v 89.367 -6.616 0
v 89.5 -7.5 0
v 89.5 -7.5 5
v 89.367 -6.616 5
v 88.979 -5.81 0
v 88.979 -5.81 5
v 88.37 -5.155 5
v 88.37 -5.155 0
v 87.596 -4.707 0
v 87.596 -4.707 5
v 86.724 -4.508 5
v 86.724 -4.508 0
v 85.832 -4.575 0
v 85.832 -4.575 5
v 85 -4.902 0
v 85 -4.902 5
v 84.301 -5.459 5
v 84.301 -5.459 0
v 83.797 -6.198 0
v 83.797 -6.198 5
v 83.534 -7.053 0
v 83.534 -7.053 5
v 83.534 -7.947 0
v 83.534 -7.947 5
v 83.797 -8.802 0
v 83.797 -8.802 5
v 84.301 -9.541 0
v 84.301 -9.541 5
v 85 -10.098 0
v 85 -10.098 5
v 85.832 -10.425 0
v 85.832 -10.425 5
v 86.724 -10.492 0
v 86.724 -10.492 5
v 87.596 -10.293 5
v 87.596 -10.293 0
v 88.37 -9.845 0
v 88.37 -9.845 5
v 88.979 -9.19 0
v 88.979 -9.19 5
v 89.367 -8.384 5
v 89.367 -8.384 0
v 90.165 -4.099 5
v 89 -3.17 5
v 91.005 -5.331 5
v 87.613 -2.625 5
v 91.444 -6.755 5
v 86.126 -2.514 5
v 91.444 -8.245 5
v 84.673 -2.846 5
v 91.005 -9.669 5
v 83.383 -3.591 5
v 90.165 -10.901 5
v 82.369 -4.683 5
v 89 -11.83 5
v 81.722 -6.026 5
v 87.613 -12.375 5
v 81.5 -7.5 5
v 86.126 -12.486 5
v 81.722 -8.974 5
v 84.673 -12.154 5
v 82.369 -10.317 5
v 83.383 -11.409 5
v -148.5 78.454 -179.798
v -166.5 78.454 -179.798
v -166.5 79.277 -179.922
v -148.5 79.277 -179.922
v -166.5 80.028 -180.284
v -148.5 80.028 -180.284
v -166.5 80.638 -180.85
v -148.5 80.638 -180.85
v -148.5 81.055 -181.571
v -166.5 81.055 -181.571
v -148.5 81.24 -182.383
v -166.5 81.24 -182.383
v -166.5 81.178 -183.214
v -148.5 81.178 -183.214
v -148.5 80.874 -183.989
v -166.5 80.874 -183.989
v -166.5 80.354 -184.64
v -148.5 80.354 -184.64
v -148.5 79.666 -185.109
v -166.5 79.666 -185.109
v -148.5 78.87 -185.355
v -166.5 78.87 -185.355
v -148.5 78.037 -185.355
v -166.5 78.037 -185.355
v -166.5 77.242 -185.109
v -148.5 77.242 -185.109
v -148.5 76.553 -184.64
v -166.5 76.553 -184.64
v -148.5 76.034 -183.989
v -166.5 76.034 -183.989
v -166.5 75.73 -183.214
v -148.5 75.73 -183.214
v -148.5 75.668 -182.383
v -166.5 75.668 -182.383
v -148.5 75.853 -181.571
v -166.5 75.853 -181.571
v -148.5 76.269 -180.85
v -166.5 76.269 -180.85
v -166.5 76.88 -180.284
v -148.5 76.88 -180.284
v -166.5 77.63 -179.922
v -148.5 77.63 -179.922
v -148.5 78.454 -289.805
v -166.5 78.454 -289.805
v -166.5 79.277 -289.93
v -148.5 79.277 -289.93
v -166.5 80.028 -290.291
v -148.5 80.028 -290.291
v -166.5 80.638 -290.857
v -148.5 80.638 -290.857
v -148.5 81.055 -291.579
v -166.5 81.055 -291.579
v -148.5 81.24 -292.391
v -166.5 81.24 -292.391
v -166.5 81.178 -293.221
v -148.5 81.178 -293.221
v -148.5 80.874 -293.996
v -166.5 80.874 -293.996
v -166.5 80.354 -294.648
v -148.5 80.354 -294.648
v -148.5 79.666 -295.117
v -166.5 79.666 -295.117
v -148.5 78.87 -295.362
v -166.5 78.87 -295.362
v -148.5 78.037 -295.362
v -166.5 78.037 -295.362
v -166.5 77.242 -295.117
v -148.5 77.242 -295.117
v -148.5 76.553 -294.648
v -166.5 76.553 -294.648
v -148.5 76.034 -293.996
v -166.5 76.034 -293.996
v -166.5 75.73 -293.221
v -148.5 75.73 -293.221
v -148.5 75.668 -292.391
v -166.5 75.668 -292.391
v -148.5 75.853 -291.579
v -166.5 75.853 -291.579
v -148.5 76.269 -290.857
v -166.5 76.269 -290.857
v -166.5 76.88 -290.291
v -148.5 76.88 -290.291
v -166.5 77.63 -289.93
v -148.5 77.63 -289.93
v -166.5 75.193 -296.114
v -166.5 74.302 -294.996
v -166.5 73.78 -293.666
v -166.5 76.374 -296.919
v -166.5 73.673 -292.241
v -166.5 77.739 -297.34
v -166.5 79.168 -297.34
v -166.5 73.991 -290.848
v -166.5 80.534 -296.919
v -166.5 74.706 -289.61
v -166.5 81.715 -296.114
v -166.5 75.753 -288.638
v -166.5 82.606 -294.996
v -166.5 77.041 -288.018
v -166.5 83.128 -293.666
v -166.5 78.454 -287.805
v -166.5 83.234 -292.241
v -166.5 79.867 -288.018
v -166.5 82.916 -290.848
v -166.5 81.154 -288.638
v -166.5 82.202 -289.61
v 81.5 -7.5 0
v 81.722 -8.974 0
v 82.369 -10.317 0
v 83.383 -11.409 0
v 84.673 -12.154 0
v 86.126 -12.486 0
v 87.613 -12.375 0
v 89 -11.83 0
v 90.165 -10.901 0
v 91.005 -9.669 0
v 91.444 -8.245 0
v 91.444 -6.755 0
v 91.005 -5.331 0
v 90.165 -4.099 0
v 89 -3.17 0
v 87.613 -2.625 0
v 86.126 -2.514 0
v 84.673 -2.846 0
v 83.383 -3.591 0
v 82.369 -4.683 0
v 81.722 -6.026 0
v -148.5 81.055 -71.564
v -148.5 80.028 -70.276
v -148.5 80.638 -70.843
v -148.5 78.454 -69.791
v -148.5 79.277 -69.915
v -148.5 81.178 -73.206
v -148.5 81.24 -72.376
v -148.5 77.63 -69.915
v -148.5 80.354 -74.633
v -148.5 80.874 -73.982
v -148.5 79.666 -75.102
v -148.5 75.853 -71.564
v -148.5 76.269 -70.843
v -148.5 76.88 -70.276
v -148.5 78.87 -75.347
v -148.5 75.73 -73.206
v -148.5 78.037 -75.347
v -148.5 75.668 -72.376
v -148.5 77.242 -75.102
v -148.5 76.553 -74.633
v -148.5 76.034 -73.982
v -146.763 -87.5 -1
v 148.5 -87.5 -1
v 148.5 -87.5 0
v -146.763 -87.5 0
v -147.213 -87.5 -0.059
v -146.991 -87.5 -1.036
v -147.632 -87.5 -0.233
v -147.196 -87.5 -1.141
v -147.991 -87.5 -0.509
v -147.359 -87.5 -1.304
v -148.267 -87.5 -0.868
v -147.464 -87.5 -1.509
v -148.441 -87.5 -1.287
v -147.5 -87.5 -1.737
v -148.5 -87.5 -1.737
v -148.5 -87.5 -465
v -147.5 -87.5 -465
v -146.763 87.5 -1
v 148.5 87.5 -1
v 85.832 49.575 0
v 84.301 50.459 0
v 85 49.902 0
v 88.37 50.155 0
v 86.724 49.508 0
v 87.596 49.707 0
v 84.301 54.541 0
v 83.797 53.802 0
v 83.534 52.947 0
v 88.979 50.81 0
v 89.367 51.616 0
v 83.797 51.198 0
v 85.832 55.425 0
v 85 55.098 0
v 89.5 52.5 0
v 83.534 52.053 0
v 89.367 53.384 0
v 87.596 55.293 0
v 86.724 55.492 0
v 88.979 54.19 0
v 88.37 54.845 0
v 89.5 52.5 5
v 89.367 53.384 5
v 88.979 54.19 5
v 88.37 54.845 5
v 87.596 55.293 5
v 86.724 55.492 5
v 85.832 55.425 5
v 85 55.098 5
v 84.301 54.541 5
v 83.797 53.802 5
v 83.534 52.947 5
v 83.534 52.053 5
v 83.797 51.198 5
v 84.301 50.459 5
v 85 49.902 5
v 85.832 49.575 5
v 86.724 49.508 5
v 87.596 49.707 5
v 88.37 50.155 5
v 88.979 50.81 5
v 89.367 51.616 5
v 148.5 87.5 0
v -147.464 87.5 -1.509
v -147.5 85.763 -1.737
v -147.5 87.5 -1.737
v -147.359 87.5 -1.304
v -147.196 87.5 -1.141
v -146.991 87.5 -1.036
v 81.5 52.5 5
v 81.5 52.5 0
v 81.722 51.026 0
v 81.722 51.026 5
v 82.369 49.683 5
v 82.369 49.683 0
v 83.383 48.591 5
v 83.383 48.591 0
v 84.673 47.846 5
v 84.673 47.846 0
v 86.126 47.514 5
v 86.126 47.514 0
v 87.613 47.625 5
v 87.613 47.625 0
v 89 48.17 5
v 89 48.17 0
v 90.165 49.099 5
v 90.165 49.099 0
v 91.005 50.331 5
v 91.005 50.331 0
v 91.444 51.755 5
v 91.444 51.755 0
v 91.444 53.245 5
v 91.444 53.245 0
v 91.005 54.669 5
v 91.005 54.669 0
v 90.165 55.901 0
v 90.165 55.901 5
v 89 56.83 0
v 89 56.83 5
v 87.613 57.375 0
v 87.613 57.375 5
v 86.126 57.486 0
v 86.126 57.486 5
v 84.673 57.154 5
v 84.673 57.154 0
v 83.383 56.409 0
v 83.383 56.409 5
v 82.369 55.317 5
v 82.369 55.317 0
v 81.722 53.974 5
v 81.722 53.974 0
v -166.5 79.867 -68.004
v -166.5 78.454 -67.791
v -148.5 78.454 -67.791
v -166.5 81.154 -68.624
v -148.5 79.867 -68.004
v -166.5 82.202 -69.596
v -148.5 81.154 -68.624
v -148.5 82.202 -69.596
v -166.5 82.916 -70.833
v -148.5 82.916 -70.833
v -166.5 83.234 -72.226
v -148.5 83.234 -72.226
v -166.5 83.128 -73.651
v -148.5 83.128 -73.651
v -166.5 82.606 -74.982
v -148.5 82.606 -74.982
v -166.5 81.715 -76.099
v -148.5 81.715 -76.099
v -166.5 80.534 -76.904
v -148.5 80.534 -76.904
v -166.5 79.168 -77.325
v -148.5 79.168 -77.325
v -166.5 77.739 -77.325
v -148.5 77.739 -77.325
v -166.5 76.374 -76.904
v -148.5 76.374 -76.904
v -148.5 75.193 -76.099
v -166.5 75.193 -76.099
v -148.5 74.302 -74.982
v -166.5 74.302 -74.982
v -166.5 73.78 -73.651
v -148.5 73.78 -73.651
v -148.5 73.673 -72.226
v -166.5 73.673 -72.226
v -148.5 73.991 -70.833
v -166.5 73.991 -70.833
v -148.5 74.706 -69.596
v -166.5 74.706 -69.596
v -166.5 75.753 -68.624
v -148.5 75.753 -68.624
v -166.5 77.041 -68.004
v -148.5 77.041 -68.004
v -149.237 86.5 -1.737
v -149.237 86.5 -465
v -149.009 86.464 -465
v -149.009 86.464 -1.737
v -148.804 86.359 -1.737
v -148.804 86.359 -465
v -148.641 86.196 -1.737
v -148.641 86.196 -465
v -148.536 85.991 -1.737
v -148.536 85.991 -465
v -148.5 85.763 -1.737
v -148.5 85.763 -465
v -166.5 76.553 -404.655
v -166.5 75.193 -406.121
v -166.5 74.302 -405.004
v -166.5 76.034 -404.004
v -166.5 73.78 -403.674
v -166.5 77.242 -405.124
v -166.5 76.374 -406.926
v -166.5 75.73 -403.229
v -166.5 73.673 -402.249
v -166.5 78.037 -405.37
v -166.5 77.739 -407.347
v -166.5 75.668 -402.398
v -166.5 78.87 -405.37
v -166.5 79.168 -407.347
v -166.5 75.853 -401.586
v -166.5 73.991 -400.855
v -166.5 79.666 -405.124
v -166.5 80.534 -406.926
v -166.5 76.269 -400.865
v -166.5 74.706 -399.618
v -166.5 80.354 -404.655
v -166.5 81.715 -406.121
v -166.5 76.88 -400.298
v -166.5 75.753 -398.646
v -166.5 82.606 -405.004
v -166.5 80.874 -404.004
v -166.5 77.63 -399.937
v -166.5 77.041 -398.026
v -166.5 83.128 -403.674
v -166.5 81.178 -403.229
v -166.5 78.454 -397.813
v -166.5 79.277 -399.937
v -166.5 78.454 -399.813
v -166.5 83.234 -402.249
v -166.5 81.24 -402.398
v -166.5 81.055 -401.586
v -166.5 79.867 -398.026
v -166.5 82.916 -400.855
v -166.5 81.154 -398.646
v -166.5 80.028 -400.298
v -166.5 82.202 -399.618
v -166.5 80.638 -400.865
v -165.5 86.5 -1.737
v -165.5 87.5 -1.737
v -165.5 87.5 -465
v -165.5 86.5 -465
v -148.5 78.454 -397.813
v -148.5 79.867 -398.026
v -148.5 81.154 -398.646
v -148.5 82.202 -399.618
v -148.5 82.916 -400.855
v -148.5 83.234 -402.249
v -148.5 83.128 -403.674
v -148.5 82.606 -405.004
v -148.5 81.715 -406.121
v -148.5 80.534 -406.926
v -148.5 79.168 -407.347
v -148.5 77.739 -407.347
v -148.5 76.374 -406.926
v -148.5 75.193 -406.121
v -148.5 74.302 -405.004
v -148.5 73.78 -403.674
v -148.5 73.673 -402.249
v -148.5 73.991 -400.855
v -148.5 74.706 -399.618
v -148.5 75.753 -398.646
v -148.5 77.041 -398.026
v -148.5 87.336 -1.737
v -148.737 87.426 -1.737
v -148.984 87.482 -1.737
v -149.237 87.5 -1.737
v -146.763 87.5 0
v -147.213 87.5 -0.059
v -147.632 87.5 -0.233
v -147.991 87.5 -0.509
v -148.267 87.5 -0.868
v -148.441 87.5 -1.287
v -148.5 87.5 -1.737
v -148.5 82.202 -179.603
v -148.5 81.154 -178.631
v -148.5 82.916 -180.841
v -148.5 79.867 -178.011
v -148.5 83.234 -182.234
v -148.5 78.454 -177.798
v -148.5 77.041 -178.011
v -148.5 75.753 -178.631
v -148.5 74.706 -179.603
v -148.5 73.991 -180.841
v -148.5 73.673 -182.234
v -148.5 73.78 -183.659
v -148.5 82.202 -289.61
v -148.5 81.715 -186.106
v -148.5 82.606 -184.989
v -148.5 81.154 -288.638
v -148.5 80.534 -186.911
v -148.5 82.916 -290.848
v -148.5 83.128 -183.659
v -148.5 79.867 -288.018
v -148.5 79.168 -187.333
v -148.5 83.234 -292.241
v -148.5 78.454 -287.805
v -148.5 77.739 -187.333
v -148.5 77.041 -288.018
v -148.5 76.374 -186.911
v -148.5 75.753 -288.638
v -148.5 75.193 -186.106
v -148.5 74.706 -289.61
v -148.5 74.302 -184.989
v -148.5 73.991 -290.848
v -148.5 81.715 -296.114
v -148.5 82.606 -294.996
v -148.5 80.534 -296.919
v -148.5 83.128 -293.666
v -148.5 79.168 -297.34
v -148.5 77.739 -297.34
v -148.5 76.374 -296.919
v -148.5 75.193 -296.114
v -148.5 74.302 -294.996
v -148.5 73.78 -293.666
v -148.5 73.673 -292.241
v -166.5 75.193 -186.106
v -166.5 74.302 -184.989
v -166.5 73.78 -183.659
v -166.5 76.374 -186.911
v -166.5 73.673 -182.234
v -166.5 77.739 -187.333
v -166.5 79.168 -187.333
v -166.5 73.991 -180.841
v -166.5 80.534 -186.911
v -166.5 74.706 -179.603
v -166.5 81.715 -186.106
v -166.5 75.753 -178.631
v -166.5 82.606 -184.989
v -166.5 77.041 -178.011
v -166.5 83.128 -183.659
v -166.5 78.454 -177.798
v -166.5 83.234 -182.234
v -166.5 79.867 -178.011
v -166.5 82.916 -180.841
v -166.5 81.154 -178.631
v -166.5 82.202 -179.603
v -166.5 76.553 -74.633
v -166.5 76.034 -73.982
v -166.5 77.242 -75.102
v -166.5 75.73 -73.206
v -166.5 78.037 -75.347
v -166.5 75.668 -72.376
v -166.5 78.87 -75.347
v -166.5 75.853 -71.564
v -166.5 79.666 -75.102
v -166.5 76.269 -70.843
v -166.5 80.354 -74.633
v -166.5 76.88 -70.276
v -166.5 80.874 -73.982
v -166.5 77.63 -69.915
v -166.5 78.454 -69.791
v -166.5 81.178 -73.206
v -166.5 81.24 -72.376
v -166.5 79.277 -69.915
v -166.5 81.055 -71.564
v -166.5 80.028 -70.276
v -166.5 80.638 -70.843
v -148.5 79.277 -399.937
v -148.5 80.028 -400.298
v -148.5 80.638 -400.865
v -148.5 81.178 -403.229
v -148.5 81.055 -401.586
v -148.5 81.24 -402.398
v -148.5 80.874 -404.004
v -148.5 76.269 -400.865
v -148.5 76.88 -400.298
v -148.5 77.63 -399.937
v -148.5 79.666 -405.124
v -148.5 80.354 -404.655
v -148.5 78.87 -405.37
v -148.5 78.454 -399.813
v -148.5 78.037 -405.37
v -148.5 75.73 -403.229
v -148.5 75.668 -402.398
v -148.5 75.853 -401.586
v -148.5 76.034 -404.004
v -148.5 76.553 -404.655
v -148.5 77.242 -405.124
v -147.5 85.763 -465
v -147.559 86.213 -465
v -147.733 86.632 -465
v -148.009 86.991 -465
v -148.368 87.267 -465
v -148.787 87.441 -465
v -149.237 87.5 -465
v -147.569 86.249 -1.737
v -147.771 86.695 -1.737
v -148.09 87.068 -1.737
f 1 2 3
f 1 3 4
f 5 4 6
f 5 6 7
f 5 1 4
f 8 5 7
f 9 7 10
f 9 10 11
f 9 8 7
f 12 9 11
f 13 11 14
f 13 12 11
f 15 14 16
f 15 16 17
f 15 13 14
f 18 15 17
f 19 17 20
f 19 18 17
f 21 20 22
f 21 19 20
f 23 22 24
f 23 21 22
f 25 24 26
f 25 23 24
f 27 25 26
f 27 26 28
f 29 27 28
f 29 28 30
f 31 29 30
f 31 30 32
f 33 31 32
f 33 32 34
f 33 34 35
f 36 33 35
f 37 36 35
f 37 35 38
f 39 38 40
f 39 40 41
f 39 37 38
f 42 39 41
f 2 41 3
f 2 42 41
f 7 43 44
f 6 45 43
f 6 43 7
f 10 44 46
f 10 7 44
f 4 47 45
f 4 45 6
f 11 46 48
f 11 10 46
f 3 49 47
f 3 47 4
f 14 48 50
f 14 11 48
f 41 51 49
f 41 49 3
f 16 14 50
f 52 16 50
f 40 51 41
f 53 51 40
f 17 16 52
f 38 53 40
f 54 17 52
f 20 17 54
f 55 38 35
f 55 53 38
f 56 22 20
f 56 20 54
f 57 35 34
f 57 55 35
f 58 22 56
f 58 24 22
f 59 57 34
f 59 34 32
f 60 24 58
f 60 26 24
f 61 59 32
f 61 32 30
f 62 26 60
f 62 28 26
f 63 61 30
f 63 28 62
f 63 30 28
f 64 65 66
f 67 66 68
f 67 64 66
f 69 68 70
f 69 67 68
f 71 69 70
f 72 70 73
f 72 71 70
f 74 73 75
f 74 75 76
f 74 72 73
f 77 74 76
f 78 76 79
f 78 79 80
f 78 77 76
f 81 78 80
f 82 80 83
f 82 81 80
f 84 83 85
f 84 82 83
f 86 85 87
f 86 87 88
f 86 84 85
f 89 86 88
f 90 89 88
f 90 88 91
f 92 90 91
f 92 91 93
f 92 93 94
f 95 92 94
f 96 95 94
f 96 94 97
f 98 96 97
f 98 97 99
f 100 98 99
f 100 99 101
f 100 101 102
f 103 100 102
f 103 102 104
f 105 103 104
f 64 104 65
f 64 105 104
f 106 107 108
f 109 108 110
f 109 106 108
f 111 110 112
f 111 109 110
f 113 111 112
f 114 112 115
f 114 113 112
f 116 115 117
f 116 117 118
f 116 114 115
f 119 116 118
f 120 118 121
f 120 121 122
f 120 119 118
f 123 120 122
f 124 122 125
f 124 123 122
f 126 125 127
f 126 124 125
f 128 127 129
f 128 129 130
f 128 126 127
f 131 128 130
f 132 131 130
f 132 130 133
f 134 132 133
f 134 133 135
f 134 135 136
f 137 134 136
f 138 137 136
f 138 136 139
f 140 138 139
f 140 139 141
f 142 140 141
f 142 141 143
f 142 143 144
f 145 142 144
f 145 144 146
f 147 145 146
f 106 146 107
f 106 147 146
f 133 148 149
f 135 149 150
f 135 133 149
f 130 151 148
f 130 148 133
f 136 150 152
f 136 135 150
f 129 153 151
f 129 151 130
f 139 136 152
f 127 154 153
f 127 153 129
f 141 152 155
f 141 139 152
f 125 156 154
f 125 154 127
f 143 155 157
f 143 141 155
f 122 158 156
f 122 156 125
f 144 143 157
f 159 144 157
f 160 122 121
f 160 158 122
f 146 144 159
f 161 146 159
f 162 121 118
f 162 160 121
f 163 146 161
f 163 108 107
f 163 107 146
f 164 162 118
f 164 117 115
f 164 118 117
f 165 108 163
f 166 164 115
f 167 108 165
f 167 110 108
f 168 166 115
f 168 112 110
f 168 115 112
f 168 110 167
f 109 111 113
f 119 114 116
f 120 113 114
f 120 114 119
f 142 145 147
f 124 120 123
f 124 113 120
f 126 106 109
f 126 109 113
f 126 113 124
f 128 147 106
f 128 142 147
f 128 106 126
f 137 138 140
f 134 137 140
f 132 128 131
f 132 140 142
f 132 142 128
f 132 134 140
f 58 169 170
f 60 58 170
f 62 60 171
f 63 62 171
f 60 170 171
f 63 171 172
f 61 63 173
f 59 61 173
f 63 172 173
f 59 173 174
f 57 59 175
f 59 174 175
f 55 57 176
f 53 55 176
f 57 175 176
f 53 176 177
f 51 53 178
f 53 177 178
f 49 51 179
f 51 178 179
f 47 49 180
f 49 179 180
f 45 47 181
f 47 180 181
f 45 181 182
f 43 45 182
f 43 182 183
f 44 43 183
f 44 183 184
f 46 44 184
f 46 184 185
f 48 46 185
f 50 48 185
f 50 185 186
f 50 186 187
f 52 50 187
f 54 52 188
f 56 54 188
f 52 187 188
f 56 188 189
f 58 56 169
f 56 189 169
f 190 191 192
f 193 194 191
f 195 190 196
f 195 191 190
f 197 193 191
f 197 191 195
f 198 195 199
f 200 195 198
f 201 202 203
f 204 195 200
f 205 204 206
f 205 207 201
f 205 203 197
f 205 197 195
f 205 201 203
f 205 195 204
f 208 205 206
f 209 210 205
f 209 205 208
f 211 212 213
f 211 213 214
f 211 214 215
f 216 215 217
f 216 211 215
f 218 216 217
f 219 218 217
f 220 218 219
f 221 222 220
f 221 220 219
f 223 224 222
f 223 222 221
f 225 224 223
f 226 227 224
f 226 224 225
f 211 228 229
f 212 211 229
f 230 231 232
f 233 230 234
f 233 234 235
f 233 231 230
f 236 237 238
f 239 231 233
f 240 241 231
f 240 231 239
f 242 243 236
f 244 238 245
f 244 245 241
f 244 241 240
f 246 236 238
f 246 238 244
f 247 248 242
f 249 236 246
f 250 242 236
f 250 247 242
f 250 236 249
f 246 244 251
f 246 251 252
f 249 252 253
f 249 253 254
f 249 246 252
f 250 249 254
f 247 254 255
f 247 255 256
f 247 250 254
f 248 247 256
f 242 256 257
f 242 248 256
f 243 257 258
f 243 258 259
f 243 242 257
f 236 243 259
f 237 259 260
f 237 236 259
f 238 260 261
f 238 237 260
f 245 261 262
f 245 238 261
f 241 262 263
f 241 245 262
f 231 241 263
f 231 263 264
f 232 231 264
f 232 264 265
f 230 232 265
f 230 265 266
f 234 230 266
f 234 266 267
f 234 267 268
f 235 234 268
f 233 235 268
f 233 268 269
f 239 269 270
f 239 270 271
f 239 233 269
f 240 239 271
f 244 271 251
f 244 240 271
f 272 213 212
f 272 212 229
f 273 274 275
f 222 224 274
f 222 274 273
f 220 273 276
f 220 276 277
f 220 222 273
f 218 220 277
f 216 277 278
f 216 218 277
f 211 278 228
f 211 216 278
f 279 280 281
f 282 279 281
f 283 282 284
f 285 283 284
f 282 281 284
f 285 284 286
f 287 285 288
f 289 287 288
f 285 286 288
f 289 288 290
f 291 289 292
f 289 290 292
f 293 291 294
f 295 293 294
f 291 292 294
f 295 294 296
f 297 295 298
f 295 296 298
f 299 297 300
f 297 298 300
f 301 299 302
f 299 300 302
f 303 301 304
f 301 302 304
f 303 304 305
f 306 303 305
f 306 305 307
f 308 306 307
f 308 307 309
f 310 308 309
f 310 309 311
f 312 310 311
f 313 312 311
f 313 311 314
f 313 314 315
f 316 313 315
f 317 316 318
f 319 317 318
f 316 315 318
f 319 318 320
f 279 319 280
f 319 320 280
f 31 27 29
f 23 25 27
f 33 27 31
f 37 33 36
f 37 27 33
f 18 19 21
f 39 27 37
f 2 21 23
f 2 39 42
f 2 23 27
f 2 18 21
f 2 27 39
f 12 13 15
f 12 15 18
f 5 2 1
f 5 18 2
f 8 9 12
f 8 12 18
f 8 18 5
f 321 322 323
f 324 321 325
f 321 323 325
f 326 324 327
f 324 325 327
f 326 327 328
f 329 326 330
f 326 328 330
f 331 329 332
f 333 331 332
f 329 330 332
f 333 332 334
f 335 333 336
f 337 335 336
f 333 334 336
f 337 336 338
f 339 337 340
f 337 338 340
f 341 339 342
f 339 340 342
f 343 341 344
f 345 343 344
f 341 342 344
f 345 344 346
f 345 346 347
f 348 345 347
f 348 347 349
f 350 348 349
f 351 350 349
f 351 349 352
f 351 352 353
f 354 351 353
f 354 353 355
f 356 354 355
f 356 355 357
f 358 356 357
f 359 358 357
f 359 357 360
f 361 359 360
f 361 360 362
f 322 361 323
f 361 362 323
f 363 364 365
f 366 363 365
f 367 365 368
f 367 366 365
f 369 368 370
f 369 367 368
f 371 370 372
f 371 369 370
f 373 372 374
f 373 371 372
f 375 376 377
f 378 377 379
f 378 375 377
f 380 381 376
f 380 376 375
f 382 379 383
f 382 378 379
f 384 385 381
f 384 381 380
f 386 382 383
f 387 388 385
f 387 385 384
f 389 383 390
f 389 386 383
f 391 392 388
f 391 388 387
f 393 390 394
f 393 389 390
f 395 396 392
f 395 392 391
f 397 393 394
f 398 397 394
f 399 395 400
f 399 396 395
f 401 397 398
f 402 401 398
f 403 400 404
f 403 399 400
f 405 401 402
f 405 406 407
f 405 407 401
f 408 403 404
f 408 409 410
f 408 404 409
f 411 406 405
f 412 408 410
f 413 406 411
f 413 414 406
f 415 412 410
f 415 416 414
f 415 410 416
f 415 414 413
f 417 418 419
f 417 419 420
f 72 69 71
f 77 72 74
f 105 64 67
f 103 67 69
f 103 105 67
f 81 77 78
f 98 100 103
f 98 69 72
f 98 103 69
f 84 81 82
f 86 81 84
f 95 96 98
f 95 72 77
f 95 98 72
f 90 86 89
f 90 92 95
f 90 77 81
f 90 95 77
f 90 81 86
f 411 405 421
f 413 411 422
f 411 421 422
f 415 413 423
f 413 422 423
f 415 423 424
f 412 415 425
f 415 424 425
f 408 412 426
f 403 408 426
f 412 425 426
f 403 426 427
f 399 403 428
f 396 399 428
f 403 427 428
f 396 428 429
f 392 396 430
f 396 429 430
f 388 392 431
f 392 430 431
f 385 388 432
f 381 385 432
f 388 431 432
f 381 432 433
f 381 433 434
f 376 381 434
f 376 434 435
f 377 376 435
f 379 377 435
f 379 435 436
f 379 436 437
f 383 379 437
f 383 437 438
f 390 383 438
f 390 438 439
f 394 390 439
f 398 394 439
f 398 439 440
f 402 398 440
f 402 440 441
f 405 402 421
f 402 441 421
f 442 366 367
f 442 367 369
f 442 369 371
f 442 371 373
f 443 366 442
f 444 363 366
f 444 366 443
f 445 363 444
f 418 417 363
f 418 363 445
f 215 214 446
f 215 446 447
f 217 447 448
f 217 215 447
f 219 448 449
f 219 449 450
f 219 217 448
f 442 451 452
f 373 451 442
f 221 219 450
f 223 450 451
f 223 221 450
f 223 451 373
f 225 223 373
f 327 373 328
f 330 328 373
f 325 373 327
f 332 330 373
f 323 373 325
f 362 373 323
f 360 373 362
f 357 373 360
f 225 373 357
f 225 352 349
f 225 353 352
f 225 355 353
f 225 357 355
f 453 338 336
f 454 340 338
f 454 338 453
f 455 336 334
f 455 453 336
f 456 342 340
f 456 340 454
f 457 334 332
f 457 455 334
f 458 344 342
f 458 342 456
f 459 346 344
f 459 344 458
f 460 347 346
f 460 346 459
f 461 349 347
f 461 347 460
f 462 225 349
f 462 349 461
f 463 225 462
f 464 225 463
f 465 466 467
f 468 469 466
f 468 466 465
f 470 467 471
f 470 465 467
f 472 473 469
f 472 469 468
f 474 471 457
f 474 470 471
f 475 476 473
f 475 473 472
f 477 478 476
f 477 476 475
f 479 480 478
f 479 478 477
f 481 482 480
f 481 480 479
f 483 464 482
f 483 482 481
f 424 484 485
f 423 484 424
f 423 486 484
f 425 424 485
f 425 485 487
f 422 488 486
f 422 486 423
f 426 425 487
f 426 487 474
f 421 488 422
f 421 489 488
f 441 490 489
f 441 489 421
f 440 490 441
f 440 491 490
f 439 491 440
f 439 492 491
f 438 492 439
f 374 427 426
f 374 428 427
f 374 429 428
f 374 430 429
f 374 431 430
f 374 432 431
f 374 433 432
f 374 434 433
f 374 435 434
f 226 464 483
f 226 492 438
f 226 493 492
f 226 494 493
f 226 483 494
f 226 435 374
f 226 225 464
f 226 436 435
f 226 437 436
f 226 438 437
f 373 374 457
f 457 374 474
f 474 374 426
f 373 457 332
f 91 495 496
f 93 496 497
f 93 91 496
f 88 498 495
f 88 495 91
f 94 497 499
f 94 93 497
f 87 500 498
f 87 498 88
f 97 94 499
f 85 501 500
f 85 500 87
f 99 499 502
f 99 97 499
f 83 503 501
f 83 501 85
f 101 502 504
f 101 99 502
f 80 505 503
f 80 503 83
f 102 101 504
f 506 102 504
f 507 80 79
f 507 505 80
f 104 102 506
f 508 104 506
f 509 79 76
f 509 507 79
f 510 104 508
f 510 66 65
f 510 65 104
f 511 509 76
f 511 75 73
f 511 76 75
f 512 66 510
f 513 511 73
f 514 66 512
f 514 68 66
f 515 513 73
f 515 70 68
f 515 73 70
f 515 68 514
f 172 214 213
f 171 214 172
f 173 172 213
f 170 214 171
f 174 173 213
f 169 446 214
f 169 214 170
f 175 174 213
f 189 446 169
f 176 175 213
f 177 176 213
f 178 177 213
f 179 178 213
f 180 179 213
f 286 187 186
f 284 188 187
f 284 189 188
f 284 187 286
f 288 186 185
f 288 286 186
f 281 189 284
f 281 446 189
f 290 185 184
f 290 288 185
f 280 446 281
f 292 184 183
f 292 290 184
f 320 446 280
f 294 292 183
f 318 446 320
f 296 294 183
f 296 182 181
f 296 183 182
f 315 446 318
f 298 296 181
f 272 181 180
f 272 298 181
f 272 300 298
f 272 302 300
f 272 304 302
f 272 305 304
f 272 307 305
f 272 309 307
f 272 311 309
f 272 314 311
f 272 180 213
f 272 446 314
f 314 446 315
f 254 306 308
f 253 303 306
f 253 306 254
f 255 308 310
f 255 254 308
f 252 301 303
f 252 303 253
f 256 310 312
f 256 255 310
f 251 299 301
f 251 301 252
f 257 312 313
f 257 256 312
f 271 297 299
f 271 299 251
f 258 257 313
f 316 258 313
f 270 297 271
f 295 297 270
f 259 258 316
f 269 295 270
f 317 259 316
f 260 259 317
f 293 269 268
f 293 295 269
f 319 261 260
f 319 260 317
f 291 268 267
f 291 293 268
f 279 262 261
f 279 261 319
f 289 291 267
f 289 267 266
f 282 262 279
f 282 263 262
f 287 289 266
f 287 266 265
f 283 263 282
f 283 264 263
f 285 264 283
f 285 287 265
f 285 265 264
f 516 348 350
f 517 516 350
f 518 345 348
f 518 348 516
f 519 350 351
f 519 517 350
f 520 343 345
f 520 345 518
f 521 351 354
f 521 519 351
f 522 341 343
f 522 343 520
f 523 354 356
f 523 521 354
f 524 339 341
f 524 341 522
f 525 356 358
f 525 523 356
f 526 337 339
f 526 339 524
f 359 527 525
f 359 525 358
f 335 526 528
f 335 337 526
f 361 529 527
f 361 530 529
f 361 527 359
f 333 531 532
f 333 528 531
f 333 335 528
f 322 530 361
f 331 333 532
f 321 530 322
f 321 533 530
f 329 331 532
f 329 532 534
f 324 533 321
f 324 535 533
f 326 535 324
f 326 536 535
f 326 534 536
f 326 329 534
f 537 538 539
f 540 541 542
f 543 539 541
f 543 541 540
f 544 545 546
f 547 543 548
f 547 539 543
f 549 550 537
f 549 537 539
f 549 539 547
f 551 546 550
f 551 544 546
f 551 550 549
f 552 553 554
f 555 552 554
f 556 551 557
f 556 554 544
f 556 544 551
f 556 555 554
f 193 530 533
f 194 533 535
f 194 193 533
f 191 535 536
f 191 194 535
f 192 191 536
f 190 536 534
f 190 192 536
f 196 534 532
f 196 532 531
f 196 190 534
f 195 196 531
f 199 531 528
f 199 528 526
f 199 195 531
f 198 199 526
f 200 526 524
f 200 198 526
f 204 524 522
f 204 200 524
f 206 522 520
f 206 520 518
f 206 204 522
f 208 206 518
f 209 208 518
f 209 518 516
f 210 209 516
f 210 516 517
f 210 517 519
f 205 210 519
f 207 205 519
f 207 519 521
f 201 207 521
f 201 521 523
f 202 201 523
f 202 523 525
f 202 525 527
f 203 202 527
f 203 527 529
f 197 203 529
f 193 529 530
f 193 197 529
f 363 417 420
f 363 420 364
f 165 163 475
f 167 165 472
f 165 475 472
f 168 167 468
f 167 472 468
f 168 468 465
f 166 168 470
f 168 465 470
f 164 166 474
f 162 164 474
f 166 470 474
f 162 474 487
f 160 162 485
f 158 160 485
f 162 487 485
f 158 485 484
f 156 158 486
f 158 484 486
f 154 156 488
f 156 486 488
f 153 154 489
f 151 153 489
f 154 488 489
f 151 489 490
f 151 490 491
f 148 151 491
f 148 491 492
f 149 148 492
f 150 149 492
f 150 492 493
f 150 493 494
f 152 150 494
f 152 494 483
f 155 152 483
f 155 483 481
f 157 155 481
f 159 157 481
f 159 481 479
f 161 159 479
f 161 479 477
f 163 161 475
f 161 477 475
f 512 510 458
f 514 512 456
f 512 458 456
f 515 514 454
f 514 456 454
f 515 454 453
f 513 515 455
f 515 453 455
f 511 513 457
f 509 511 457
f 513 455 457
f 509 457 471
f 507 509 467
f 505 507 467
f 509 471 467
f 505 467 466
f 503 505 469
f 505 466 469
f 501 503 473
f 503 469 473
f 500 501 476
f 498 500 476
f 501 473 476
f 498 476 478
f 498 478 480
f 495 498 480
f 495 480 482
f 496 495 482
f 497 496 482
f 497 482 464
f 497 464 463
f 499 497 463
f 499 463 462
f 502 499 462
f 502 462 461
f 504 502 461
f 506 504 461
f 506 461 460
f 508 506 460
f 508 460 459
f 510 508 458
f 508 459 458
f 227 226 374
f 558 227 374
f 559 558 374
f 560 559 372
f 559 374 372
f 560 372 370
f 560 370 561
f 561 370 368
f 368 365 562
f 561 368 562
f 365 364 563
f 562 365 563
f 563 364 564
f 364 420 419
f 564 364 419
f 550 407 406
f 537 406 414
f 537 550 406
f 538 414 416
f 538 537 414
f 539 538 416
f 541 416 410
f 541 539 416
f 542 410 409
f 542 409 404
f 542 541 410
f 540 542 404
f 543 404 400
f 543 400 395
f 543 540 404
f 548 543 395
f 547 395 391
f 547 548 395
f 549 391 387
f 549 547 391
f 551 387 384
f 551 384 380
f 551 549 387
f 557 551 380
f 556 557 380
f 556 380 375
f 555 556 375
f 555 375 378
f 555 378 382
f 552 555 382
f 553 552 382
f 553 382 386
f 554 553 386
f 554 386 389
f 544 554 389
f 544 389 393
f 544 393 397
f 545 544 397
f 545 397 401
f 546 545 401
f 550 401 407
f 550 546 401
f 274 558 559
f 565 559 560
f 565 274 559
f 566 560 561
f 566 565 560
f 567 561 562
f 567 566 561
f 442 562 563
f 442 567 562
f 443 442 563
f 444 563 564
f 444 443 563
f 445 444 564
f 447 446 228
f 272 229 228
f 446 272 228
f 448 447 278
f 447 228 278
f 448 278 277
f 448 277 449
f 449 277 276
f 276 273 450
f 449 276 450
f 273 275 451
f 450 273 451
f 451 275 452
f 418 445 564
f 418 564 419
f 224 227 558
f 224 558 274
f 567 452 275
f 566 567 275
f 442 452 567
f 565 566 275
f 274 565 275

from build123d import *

# Parameters (mm, degrees)
SKETCH1_W                    = 297
SKETCH1_H                    = 175
BASE_FLANGE1_DEPTH           = 1
EDGE_FLANGE1_STRIP_W         = 5.4732
EDGE_FLANGE1_STRIP_H         = 1
EDGE_FLANGE1_STRIP_CUT_DEPTH = 175
EDGE_FLANGE1_DEPTH           = 175
EDGE_FLANGE2_STRIP_W         = 5.4732
EDGE_FLANGE2_STRIP_H         = 1
EDGE_FLANGE2_STRIP_CUT_DEPTH = 463.2634
EDGE_FLANGE2_DEPTH           = 463.2634
SKETCH17_R                   = 4.794
SKETCH17_R_2                 = 2.794
BOSS_EXTRUDE1_DEPTH          = 18
SKETCH21_R                   = 5
SKETCH21_R_2                 = 3
BOSS_EXTRUDE2_DEPTH          = 5


# Sheet-metal steps are written as plain solids
with BuildPart() as part:
    # Sketch1 → Base-Flange1 (new body)
    with BuildSketch(Plane.XY):
        Rectangle(SKETCH1_W, SKETCH1_H)
    extrude(amount=-BASE_FLANGE1_DEPTH)

    # Edge-Flange1 strip (across the edge) → Edge-Flange1 strip cut (cut)
    with BuildSketch(Plane(origin=(-148.5, -87.5, -1), x_dir=(1, 0, 0), z_dir=(0, 1, 0))):
        with Locations((-1, -0.5)):
            Rectangle(EDGE_FLANGE1_STRIP_W, EDGE_FLANGE1_STRIP_H)
    extrude(amount=EDGE_FLANGE1_STRIP_CUT_DEPTH, mode=Mode.SUBTRACT)

    # Edge-Flange1 section (across the edge) → Edge-Flange1 (add)
    with BuildSketch(Plane(origin=(-148.5, -87.5, -1), x_dir=(1, 0, 0), z_dir=(0, 1, 0))):
        with BuildLine():
            Line((0, 0.7366), (0, 464))
            Line((0, 464), (1, 464))
            Line((1, 464), (1, 0.7366))
            ThreePointArc((1, 0.7366), (1.215745145, 0.215745145), (1.7366, 0))
            Line((1.7366, 0), (1.7366, -1))
            ThreePointArc((1.7366, -1), (0.508638364, -0.491361636), (0, 0.7366))
        make_face()
    extrude(amount=EDGE_FLANGE1_DEPTH)

    # Edge-Flange2 strip (across the edge) → Edge-Flange2 strip cut (cut)
    with BuildSketch(Plane(origin=(-148.5, 87.5, -1.7366), x_dir=(0, -1, 0), z_dir=(0, 0, -1))):
        with Locations((-1, -0.5)):
            Rectangle(EDGE_FLANGE2_STRIP_W, EDGE_FLANGE2_STRIP_H)
    extrude(amount=EDGE_FLANGE2_STRIP_CUT_DEPTH, mode=Mode.SUBTRACT)

    # Edge-Flange2 section (across the edge) → Edge-Flange2 (add)
    with BuildSketch(Plane(origin=(-148.5, 87.5, -1.7366), x_dir=(0, -1, 0), z_dir=(0, 0, -1))):
        with BuildLine():
            Line((0, 0.7366), (0, 17))
            Line((0, 17), (1, 17))
            Line((1, 17), (1, 0.7366))
            ThreePointArc((1, 0.7366), (1.215745145, 0.215745145), (1.7366, 0))
            Line((1.7366, 0), (1.7366, -1))
            ThreePointArc((1.7366, -1), (0.508638364, -0.491361636), (0, 0.7366))
        make_face()
    extrude(amount=EDGE_FLANGE2_DEPTH)

    # Sketch17 → Boss-Extrude1 (add)
    # profile 1 of 4: a face of its own
    with BuildSketch(Plane.ZY.offset(148.5)):
        with Locations((-72.584668807, 78.453866984)):
            Circle(SKETCH17_R)
        with Locations((-72.584668807, 78.453866984)):
            Circle(SKETCH17_R_2, mode=Mode.SUBTRACT)
    # profile 2 of 4: a face of its own
    with BuildSketch(Plane.ZY.offset(148.5)):
        with Locations((-182.592068807, 78.453866984)):
            Circle(SKETCH17_R)
        with Locations((-182.592068807, 78.453866984)):
            Circle(SKETCH17_R_2, mode=Mode.SUBTRACT)
    # profile 3 of 4: a face of its own
    with BuildSketch(Plane.ZY.offset(148.5)):
        with Locations((-292.599468807, 78.453866984)):
            Circle(SKETCH17_R)
        with Locations((-292.599468807, 78.453866984)):
            Circle(SKETCH17_R_2, mode=Mode.SUBTRACT)
    # profile 4 of 4: a face of its own
    with BuildSketch(Plane.ZY.offset(148.5)):
        with Locations((-402.606868807, 78.453866984)):
            Circle(SKETCH17_R)
        with Locations((-402.606868807, 78.453866984)):
            Circle(SKETCH17_R_2, mode=Mode.SUBTRACT)
    extrude(amount=BOSS_EXTRUDE1_DEPTH)

    # Sketch21 → Boss-Extrude2 (add)
    # profile 1 of 2: a face of its own
    with BuildSketch(Plane.XY):
        with Locations(Location((86.5, 52.5, 0), (0, 0, 180))):
            Circle(SKETCH21_R)
        with Locations((86.5, 52.5)):
            Circle(SKETCH21_R_2, mode=Mode.SUBTRACT)
    # profile 2 of 2: a face of its own
    with BuildSketch(Plane.XY):
        with Locations(Location((86.5, -7.5, 0), (0, 0, 180))):
            Circle(SKETCH21_R)
        with Locations((86.5, -7.5)):
            Circle(SKETCH21_R_2, mode=Mode.SUBTRACT)
    extrude(amount=BOSS_EXTRUDE2_DEPTH)


solid = part.part
